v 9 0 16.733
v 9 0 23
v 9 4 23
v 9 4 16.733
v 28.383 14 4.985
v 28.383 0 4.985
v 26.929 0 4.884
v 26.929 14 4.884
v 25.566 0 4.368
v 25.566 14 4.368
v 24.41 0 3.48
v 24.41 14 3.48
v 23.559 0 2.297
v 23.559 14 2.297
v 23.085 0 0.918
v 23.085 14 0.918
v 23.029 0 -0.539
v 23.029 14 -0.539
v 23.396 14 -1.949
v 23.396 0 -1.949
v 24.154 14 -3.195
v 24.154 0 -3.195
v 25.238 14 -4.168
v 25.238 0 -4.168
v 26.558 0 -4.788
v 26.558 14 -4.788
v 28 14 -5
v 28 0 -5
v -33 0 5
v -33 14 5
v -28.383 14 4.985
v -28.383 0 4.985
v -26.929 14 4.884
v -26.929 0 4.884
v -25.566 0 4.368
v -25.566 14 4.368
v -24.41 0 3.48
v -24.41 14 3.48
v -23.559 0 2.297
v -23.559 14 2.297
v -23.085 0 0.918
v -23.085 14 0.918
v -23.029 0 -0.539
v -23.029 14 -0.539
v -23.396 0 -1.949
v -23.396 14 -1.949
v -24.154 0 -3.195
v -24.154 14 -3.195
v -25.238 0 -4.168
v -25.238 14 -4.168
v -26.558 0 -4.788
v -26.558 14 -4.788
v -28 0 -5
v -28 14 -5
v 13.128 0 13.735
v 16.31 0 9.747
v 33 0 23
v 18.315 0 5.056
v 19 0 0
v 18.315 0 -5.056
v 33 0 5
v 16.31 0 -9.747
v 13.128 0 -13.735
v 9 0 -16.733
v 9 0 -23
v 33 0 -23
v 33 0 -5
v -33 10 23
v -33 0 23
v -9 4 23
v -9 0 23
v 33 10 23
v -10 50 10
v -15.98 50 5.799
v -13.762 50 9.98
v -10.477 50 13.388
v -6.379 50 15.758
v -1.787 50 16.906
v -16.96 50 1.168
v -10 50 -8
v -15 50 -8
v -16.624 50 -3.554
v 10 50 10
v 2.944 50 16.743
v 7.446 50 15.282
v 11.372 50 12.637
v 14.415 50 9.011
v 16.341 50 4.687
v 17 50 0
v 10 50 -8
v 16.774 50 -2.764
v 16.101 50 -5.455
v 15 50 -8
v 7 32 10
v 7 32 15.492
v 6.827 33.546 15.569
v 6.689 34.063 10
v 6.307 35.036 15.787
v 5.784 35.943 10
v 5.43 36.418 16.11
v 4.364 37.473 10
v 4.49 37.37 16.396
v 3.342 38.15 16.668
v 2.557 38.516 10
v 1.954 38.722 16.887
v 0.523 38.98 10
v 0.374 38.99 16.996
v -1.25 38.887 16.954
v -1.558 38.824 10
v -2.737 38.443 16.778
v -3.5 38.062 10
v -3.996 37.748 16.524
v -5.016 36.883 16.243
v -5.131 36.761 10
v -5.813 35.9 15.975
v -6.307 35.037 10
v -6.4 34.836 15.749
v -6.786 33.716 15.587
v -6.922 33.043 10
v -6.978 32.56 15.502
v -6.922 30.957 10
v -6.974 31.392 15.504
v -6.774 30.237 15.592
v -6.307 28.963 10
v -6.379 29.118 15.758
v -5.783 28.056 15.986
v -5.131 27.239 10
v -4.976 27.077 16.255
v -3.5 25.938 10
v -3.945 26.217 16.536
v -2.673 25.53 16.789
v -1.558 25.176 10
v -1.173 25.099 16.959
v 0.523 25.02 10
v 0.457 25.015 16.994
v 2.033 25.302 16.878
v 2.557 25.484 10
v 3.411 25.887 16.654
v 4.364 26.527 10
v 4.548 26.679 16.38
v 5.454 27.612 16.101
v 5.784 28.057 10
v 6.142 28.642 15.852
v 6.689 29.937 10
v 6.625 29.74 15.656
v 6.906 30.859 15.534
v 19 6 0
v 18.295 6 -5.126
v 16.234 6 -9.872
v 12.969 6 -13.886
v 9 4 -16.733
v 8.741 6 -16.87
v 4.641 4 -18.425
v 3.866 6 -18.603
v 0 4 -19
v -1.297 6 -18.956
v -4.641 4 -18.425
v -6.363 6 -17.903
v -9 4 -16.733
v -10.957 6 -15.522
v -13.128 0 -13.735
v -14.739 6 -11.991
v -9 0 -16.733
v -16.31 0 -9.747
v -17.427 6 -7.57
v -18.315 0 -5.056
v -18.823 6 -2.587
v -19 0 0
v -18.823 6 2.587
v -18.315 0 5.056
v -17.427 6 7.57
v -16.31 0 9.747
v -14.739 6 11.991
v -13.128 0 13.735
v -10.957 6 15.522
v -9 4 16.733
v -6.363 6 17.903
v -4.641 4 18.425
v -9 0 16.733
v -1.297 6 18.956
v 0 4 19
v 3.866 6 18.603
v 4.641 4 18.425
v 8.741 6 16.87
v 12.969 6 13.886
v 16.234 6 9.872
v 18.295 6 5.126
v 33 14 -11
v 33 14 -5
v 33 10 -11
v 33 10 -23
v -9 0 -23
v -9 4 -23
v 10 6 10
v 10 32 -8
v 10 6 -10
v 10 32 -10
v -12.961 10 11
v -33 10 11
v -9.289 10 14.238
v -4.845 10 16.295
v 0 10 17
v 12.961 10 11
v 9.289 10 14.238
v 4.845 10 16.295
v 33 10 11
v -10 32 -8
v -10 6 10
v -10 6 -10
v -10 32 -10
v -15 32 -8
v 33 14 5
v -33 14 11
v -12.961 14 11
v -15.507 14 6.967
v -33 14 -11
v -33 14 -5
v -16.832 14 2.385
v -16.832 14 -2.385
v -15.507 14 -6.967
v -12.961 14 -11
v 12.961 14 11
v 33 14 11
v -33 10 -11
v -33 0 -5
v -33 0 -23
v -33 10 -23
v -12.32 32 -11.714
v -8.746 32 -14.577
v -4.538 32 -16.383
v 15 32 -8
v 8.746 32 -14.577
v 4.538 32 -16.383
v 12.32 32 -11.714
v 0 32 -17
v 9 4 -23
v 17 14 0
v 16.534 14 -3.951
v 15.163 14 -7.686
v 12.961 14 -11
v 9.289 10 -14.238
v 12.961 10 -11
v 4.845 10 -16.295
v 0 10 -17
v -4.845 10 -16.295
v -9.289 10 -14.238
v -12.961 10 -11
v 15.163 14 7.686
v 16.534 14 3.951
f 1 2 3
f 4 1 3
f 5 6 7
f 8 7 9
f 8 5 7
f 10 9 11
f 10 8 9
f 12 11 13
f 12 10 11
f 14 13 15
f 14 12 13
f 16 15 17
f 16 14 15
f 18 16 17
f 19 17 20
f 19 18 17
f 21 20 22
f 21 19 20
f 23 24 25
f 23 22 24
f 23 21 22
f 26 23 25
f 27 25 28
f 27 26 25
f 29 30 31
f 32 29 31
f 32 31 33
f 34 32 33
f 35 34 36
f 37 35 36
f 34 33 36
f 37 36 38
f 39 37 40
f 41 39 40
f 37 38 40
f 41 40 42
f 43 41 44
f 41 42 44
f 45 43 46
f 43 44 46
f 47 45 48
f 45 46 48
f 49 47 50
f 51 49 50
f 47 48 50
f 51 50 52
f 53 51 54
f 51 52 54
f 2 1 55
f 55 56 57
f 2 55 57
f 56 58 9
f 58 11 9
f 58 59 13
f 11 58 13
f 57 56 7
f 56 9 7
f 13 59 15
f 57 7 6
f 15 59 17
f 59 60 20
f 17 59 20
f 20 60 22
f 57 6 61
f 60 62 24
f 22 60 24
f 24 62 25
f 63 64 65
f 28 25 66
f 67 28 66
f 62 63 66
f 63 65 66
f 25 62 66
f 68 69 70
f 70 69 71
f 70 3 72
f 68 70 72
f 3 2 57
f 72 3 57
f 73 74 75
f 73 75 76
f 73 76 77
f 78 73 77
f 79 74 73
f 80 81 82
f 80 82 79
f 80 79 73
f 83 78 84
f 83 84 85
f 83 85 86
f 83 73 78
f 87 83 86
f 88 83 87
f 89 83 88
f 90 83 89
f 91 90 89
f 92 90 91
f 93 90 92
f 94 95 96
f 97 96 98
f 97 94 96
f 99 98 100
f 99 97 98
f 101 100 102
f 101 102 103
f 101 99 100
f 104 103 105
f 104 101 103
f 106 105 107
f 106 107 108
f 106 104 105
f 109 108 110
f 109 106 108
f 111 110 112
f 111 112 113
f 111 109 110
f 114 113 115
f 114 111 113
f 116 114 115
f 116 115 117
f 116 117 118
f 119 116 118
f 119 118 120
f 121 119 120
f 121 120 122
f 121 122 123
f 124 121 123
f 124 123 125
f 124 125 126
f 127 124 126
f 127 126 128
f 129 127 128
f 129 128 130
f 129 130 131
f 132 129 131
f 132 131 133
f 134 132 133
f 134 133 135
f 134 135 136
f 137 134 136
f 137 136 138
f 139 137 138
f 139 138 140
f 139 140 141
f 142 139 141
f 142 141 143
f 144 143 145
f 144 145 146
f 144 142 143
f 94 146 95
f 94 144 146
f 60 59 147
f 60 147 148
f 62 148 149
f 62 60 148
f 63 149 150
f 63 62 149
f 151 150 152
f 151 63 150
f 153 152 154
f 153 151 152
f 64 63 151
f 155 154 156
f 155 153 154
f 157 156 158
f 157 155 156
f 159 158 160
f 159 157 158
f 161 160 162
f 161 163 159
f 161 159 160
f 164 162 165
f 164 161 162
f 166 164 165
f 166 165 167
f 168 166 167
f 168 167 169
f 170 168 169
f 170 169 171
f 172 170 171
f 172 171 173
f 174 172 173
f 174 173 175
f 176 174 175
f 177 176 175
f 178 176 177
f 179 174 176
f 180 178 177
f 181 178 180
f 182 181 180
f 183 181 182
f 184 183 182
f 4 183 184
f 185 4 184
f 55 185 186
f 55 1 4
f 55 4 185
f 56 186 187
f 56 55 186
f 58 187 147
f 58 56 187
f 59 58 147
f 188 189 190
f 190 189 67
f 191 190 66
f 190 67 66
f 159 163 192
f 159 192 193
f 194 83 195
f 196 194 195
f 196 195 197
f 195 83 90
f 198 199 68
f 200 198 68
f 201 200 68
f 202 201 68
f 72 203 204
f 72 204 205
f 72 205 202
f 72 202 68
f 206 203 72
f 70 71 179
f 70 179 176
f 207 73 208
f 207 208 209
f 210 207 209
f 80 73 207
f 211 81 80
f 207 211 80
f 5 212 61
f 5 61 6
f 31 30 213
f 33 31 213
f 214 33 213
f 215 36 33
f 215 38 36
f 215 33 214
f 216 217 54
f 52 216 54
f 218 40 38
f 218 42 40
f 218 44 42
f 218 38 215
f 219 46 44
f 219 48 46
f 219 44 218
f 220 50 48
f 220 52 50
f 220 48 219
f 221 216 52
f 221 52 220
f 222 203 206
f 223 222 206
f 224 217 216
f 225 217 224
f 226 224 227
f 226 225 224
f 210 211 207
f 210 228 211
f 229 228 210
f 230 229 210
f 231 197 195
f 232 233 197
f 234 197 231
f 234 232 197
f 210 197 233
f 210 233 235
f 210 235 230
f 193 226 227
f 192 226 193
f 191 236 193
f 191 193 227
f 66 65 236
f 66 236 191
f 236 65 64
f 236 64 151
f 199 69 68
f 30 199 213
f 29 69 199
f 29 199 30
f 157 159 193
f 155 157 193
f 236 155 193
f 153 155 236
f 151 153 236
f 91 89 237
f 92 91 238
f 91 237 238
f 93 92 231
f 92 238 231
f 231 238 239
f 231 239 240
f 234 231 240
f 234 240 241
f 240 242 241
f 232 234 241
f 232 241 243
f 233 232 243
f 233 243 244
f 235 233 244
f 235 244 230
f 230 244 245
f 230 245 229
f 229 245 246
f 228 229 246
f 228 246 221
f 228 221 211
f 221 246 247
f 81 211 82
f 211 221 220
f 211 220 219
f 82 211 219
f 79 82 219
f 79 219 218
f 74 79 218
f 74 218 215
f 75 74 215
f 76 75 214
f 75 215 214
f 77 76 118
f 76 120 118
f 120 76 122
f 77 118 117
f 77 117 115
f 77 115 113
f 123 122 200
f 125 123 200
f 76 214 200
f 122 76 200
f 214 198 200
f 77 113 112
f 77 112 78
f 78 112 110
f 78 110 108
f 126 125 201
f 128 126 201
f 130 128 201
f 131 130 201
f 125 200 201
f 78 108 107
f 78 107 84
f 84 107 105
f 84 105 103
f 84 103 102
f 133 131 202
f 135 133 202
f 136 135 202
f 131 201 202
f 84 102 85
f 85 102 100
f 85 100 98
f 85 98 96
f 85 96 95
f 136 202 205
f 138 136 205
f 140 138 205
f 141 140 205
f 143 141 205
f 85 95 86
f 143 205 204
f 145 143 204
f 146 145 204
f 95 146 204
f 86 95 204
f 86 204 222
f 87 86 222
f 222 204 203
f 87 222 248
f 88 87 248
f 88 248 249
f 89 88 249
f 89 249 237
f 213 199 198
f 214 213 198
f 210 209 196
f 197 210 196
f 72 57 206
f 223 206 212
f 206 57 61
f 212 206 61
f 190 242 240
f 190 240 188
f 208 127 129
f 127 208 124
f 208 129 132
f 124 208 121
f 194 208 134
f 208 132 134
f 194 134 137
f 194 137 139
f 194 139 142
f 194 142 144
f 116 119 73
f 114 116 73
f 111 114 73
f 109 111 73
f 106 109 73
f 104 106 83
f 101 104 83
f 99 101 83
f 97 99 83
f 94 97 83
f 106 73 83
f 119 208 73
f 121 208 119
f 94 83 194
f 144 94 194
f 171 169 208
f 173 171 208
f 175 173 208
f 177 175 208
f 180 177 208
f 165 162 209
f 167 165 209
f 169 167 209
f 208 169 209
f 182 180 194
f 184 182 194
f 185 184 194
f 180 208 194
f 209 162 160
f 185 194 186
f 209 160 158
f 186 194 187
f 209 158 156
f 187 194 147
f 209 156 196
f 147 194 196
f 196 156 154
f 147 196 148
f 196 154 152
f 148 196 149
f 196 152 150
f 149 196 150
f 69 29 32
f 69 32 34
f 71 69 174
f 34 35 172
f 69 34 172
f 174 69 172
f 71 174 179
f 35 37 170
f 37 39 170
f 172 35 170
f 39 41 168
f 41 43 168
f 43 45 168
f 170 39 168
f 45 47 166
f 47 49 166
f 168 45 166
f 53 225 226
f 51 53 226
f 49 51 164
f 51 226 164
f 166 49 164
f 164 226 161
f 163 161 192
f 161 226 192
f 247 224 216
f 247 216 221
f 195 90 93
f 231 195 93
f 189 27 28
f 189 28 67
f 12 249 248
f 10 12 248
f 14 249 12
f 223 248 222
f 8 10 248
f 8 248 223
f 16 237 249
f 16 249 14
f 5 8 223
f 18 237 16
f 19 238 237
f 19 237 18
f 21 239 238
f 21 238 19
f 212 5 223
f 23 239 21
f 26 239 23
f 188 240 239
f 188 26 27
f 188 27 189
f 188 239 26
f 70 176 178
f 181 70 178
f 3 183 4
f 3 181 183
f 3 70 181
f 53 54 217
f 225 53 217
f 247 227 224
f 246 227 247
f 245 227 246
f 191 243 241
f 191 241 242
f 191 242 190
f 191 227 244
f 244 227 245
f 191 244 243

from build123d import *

# Parameters (mm, degrees)
SKETCH_1_W          = 66
SKETCH_1_H          = 46
EXTRUDE_1_DEPTH     = 10
SKETCH_2_W          = 66
SKETCH_2_H          = 22
EXTRUDE_2_DEPTH     = 4
SKETCH_3_R          = 17
EXTRUDE_3_DEPTH     = 50
SKETCH_4_W          = 18
SKETCH_4_H          = 4
CUT_EXTRUDE_1_DEPTH = 47
CUT_EXTRUDE_2_DEPTH = 15
SKETCH_6_W          = 20
SKETCH_6_H          = 20
CUT_EXTRUDE_3_DEPTH = 51
CUT_EXTRUDE_4_DEPTH = 18
SKETCH_8_R          = 7
CUT_EXTRUDE_5_DEPTH = 24
SKETCH_9_R          = 19
CUT_EXTRUDE_6_DEPTH = 6


with BuildPart() as part:
    # 草图1 → 凸台-拉伸1 (new body)
    with BuildSketch(Plane(origin=(0, 0, 0), x_dir=(1, 0, 0), z_dir=(0, 1, 0))):
        Rectangle(SKETCH_1_W, SKETCH_1_H)
    extrude(amount=EXTRUDE_1_DEPTH)

    # 草图2 → 凸台-拉伸2 (add)
    with BuildSketch(Plane(origin=(0, 10, 0), x_dir=(1, 0, 0), z_dir=(0, 1, 0))):
        Rectangle(SKETCH_2_W, SKETCH_2_H)
    extrude(amount=EXTRUDE_2_DEPTH)

    # 草图3 → 凸台-拉伸3 (add)
    with BuildSketch(Plane(origin=(0, 0, 0), x_dir=(1, 0, 0), z_dir=(0, 1, 0))):
        Circle(SKETCH_3_R)
    extrude(amount=EXTRUDE_3_DEPTH)

    # 草图4 → 切除-拉伸1 (cut, through all)
    with BuildSketch(Plane.XY.offset(23)):
        with Locations((0, 2)):
            Rectangle(SKETCH_4_W, SKETCH_4_H)
    extrude(amount=-CUT_EXTRUDE_1_DEPTH, mode=Mode.SUBTRACT)

    # 草图5 → 切除-拉伸2 (cut, through all)
    with BuildSketch(Plane(origin=(0, 14, 0), x_dir=(1, 0, 0), z_dir=(0, 1, 0))):
        with BuildLine():
            Line((-28, 5), (-33, 5))
            Line((-33, 5), (-33, -5))
            Line((-33, -5), (-28.383132006, -4.985299376))
            ThreePointArc((-28.383132006, -4.985299376), (-23.003676508, -0.191706965), (-28, 5))
        make_face()
        with BuildLine():
            Line((33, -5), (28.383132006, -4.985299376))
            ThreePointArc((28.383132006, -4.985299376), (23.003676508, -0.191706965), (28, 5))
            Line((28, 5), (33, 5))
            Line((33, 5), (33, -5))
        make_face()
    extrude(amount=-CUT_EXTRUDE_2_DEPTH, mode=Mode.SUBTRACT)

    # 草图6 → 切除-拉伸3 (cut, through all)
    with BuildSketch(Plane(origin=(0, 50, 0), x_dir=(1, 0, 0), z_dir=(0, 1, 0))):
        Rectangle(SKETCH_6_W, SKETCH_6_H)
    extrude(amount=-CUT_EXTRUDE_3_DEPTH, mode=Mode.SUBTRACT)

    # 草图7 → 切除-拉伸4 (cut)
    with BuildSketch(Plane(origin=(0, 50, 0), x_dir=(1, 0, 0), z_dir=(0, 1, 0))):
        with BuildLine():
            Line((-15, 8), (-10, 8))
            Line((-10, 8), (-10, 10))
            Line((-10, 10), (10, 10))
            Line((10, 10), (10, 8))
            Line((10, 8), (15, 8))
            ThreePointArc((15, 8), (0, 17), (-15, 8))
        make_face()
    extrude(amount=-CUT_EXTRUDE_4_DEPTH, mode=Mode.SUBTRACT)

    # 草图8 → 切除-拉伸5 (cut, through all)
    with BuildSketch(Plane.XY):
        with Locations((0, 32)):
            Circle(SKETCH_8_R)
    extrude(amount=CUT_EXTRUDE_5_DEPTH, mode=Mode.SUBTRACT)

    # 草图9 → 切除-拉伸6 (cut)
    with BuildSketch(Plane(origin=(0, 0, 0), x_dir=(1, 0, 0), z_dir=(0, 1, 0))):
        Circle(SKETCH_9_R)
    extrude(amount=CUT_EXTRUDE_6_DEPTH, mode=Mode.SUBTRACT)


solid = part.part
